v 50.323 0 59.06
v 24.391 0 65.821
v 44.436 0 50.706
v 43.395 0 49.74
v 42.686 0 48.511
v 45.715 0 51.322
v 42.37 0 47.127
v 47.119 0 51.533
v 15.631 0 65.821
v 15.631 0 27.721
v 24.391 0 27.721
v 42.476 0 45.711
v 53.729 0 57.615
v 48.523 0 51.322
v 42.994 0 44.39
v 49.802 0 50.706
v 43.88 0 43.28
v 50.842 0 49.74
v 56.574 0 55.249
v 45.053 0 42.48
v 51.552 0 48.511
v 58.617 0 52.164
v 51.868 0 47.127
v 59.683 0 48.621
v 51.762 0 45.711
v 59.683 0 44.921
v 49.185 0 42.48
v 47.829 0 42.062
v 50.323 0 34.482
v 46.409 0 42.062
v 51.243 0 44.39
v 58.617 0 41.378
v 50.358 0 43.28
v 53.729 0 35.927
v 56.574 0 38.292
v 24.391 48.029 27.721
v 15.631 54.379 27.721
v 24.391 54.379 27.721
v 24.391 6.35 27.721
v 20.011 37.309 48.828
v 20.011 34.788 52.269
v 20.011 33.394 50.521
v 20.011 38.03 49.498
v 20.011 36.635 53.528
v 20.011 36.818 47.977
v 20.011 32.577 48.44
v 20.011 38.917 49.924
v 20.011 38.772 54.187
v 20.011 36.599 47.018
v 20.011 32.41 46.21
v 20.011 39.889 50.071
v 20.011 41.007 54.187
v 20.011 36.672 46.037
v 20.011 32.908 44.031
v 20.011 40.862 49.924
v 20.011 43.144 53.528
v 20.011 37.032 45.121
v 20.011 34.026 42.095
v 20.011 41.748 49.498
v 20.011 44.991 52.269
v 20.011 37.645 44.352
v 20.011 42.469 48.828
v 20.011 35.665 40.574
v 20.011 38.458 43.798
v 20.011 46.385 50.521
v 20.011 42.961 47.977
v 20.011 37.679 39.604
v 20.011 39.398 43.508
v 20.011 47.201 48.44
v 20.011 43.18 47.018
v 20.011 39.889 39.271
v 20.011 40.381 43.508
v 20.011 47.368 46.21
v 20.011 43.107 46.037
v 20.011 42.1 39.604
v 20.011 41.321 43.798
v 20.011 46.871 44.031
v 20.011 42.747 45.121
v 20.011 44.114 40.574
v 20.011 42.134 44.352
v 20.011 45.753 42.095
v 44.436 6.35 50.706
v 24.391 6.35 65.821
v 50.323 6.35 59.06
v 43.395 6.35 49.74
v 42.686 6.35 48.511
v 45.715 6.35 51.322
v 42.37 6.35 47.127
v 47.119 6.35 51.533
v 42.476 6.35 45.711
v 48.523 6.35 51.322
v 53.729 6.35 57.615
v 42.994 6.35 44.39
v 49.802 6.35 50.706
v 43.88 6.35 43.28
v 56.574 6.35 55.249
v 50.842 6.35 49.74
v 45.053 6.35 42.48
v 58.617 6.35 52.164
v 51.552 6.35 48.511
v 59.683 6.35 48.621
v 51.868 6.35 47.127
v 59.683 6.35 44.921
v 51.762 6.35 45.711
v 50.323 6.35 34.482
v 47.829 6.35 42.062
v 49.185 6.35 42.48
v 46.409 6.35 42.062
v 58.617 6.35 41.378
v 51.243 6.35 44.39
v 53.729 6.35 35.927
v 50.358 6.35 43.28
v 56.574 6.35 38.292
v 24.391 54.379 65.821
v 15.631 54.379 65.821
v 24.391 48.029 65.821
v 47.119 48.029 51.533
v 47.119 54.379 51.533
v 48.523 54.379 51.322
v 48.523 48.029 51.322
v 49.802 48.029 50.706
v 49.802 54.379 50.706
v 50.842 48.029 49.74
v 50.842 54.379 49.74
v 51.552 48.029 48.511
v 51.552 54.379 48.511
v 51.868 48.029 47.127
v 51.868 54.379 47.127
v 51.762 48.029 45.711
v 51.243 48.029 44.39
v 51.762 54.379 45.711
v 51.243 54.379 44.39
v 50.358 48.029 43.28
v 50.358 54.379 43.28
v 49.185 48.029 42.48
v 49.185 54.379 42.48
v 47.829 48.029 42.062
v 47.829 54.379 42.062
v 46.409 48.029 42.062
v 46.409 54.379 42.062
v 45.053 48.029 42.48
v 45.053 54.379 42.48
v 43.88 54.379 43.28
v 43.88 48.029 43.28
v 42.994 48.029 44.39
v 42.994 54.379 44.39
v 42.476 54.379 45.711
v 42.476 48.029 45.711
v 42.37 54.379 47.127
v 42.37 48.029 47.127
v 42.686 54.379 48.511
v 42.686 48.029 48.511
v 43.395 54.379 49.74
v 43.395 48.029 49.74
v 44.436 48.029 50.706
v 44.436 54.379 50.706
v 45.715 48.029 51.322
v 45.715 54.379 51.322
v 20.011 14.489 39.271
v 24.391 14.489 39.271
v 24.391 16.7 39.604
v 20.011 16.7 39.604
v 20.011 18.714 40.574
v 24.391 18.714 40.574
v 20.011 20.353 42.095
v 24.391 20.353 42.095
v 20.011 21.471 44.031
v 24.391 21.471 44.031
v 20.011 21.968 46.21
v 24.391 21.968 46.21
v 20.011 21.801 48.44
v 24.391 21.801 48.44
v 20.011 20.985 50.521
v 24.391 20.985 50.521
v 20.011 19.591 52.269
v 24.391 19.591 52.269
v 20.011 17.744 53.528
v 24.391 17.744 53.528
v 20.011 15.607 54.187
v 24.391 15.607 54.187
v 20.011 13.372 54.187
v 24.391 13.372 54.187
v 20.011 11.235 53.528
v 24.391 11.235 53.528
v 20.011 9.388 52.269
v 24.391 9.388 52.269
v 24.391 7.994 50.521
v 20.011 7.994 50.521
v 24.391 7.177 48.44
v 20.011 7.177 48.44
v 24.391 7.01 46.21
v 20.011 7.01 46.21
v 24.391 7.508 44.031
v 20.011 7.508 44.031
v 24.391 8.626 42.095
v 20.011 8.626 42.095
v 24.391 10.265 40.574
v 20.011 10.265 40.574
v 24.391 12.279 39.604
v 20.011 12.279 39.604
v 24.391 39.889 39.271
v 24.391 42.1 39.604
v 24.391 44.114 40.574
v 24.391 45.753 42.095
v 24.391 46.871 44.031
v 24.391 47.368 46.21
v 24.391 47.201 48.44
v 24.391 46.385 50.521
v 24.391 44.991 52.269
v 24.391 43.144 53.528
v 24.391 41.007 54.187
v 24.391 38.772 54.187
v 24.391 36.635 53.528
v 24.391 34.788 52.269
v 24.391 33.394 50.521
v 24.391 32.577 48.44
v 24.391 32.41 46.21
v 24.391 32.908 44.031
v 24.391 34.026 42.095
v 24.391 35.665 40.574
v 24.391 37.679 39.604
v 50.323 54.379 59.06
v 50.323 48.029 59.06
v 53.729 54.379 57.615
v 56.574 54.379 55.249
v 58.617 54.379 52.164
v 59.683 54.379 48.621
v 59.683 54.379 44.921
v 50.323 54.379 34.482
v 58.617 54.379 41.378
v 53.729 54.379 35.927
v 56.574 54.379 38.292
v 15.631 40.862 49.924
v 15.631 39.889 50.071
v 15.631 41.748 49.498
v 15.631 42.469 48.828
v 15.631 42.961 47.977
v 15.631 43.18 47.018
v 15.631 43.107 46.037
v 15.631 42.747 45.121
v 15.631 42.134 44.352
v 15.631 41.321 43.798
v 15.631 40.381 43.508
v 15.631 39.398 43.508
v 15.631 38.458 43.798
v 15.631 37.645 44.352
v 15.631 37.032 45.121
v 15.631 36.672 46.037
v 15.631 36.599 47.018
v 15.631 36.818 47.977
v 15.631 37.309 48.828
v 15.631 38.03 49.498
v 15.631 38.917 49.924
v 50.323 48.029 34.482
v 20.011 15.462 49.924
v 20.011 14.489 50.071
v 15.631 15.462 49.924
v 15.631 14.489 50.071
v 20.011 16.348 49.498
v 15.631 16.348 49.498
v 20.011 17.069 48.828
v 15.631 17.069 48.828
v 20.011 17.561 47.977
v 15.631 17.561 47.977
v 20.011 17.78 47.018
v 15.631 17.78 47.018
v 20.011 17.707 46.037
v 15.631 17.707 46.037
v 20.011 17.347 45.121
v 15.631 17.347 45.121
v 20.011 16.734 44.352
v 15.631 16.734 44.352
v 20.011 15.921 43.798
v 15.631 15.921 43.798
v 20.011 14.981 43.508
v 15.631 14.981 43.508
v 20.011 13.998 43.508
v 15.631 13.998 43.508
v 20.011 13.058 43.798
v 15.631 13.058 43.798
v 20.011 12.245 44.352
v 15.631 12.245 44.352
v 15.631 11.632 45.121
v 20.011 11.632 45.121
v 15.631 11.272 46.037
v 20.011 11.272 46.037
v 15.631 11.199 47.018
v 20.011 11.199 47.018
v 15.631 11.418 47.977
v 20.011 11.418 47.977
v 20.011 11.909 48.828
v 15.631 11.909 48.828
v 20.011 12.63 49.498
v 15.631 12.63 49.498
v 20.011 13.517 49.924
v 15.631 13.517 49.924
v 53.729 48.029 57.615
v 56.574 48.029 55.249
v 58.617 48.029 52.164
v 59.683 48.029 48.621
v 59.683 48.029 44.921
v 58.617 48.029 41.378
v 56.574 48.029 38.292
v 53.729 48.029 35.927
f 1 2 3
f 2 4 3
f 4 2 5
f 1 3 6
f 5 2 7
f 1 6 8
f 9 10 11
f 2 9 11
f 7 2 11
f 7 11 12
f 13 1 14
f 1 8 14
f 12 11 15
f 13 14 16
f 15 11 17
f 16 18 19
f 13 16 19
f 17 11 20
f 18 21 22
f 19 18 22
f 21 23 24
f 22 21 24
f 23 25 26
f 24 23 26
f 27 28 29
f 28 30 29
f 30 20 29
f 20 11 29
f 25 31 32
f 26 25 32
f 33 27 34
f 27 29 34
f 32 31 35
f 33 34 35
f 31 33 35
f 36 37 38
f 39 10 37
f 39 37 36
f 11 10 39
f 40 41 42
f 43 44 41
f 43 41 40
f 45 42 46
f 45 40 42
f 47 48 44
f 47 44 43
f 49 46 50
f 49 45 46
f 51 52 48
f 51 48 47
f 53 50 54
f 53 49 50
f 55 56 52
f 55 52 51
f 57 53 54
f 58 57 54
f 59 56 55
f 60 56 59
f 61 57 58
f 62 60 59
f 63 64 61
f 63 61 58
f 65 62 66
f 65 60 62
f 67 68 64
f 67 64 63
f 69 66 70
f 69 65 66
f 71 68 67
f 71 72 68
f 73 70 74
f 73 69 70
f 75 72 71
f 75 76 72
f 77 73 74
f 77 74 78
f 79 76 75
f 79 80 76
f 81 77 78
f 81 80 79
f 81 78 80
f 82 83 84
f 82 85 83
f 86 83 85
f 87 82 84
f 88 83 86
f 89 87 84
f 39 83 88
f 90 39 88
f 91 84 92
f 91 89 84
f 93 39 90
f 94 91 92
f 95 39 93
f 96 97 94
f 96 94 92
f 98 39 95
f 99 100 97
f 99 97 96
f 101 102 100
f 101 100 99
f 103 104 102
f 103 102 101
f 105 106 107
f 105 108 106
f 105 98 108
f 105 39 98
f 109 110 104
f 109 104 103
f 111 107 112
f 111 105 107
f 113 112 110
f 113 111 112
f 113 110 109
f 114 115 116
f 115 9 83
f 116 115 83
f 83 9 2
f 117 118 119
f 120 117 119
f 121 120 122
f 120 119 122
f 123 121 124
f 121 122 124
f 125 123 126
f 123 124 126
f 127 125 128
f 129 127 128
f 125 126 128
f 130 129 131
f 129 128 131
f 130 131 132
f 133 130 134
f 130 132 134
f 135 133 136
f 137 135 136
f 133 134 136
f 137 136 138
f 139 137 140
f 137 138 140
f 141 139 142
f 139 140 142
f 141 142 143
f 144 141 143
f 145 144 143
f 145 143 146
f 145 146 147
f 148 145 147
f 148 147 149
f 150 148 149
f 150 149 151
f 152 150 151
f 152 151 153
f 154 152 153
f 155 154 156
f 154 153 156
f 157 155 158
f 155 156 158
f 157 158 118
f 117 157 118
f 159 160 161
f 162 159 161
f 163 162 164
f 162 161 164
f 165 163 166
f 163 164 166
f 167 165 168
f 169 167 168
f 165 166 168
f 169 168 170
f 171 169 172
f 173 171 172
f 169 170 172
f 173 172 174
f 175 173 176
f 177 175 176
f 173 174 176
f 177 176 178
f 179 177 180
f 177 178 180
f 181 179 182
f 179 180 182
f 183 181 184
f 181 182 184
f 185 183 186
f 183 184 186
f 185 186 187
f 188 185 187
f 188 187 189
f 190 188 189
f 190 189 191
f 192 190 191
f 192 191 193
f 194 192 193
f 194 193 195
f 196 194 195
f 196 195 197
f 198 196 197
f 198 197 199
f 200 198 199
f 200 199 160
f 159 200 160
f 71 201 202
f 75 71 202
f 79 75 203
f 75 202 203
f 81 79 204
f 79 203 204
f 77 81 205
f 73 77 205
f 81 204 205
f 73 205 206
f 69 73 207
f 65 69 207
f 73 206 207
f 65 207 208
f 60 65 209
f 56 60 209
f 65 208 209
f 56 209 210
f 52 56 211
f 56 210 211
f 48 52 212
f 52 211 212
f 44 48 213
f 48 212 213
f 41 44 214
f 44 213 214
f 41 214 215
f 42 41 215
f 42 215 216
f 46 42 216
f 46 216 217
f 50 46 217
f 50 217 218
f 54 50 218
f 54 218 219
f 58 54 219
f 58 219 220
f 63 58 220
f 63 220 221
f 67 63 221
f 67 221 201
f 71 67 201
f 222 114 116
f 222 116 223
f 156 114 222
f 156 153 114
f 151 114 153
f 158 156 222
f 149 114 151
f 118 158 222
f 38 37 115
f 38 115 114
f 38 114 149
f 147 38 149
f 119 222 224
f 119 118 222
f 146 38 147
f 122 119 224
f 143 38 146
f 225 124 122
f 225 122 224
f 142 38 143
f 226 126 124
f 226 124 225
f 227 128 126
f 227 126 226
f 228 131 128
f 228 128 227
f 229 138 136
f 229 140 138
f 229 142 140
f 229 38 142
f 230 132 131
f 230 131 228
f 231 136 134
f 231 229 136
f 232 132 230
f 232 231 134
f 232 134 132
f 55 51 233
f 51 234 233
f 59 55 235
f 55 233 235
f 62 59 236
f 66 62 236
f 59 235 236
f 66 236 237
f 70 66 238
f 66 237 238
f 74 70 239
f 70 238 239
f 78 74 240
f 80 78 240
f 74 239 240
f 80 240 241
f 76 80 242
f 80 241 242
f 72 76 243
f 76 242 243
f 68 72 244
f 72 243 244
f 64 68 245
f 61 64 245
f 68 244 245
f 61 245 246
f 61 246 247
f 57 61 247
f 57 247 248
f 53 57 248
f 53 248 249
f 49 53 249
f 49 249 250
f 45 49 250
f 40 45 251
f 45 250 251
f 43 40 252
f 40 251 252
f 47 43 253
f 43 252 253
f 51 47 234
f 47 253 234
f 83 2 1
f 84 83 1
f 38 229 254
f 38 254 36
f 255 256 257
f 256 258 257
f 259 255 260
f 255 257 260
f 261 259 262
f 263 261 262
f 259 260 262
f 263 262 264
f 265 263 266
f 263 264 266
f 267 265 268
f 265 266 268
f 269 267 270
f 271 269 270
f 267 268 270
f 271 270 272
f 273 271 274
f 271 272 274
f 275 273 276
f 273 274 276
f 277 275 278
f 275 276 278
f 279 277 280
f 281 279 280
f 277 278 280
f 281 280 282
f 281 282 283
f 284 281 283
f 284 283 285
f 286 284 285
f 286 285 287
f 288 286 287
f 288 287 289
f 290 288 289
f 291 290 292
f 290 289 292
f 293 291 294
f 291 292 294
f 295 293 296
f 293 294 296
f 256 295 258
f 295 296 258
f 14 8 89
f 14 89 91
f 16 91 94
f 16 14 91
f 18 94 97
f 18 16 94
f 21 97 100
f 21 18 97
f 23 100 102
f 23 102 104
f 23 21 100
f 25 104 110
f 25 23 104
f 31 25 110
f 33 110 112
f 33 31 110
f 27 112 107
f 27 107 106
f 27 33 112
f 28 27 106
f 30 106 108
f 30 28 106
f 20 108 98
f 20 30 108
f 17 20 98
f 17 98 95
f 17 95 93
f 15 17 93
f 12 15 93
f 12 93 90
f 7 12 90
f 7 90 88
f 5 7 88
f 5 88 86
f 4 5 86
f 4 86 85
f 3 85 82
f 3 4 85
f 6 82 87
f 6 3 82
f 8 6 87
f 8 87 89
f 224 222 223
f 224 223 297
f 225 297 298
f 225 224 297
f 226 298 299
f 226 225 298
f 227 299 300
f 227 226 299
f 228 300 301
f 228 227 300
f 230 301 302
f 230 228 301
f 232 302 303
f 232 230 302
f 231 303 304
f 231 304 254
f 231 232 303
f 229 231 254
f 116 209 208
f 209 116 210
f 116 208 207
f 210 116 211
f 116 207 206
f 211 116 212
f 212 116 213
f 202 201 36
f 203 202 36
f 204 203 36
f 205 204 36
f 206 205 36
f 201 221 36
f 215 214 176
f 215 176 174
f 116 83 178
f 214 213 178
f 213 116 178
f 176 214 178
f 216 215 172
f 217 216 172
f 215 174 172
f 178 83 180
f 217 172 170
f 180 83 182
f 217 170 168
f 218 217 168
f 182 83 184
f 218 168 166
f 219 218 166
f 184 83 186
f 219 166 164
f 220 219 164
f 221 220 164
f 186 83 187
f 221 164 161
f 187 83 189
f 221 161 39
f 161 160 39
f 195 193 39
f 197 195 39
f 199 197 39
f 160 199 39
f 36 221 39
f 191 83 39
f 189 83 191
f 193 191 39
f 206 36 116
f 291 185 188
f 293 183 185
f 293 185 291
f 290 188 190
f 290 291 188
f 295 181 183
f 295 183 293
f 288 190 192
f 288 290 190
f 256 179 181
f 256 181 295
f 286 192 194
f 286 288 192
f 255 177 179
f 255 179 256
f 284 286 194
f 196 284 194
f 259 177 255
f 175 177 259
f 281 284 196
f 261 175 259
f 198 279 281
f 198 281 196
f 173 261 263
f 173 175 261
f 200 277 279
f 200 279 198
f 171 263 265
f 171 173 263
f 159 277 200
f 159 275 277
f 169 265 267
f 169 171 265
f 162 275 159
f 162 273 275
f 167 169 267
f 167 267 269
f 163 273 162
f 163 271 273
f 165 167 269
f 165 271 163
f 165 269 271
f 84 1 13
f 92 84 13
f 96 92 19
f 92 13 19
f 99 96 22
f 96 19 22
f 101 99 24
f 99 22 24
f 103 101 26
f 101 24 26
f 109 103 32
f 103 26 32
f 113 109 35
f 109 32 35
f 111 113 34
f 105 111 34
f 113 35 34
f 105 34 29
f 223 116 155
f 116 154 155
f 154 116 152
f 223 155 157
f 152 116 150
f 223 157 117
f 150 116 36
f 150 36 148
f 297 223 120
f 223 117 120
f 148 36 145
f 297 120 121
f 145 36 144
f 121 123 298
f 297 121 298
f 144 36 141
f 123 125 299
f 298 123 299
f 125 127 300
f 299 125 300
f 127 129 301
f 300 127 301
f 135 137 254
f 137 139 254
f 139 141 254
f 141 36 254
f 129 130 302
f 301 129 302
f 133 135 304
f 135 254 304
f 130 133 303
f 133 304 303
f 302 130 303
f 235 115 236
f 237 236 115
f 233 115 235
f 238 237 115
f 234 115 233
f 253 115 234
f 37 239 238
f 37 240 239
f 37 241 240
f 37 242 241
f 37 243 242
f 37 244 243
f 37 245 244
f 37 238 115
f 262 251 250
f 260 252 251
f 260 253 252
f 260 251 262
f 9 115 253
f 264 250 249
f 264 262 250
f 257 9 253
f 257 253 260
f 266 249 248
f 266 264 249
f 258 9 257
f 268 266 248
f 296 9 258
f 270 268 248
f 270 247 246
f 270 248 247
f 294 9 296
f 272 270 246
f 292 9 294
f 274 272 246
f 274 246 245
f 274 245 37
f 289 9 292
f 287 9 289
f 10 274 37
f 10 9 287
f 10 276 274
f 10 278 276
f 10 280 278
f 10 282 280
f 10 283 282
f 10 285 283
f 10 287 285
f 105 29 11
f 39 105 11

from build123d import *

# Parameters (mm, degrees)
SKETCH1_W                               = 8.76
SKETCH1_H                               = 38.1
BOSS_EXTRUDE1_DEPTH                     = 54.37886
CBORE_FOR_M6_HEX_HEAD_BOLT1_D           = 6.6
CBORE_FOR_M6_HEX_HEAD_BOLT1_DEPTH       = 14.019159957
CBORE_FOR_M6_HEX_HEAD_BOLT1_CBORE_D     = 15
CBORE_FOR_M6_HEX_HEAD_BOLT1_CBORE_DEPTH = 4.38
CBORE_FOR_M6_HEX_HEAD_BOLT1_TIP         = 1.982840043
SKETCH6_R                               = 4.7625
BOSS_EXTRUDE2_DEPTH                     = 6.35


with BuildPart() as part:
    # Sketch1 → Boss-Extrude1 (new body)
    with BuildSketch(Plane(origin=(0, 0, 0), x_dir=(1, 0, 0), z_dir=(0, 1, 0))):
        with Locations((20.010864679, -46.77095316)):
            Rectangle(SKETCH1_W, SKETCH1_H)
    extrude(amount=BOSS_EXTRUDE1_DEPTH)

    # CBORE for M6 Hex Head Bolt1
    with Locations(Plane(origin=(24.390864679, 0, 0), x_dir=(0, 0, -1), z_dir=(1, 0, 0))):
        with Locations((-46.77095316, 14.48943), (-46.77095316, 39.88943)):
            CounterBoreHole(CBORE_FOR_M6_HEX_HEAD_BOLT1_D / 2, CBORE_FOR_M6_HEX_HEAD_BOLT1_CBORE_D / 2, CBORE_FOR_M6_HEX_HEAD_BOLT1_CBORE_DEPTH, depth=CBORE_FOR_M6_HEX_HEAD_BOLT1_DEPTH)
            with Locations((0, 0, -(CBORE_FOR_M6_HEX_HEAD_BOLT1_DEPTH + CBORE_FOR_M6_HEX_HEAD_BOLT1_TIP / 2))):  # 118° drill point
                Cone(0, CBORE_FOR_M6_HEX_HEAD_BOLT1_D / 2, CBORE_FOR_M6_HEX_HEAD_BOLT1_TIP, mode=Mode.SUBTRACT)

    # Sketch6 → Boss-Extrude2 (add)
    with BuildSketch(Plane(origin=(0, 54.37886, 0), x_dir=(1, 0, 0), z_dir=(0, 1, 0))):
        with BuildLine():
            Line((24.390864679, -27.72095316), (24.390864679, -65.82095316))
            Line((24.390864679, -65.82095316), (50.322824333, -59.060163405))
            ThreePointArc((50.322824333, -59.060163405), (59.818871843, -46.77095316), (50.322824333, -34.481742916))
            Line((50.322824333, -34.481742916), (24.390864679, -27.72095316))
        make_face()
        with Locations(Location((47.118871843, -46.77095316, 0), (0, 0, 270))):
            Circle(SKETCH6_R, mode=Mode.SUBTRACT)
    boss_extrude2 = extrude(amount=-BOSS_EXTRUDE2_DEPTH)

    # Mirror1: Boss-Extrude2 across plane
    add(boss_extrude2.mirror(Plane.ZX.offset(27.18943)))


solid = part.part
